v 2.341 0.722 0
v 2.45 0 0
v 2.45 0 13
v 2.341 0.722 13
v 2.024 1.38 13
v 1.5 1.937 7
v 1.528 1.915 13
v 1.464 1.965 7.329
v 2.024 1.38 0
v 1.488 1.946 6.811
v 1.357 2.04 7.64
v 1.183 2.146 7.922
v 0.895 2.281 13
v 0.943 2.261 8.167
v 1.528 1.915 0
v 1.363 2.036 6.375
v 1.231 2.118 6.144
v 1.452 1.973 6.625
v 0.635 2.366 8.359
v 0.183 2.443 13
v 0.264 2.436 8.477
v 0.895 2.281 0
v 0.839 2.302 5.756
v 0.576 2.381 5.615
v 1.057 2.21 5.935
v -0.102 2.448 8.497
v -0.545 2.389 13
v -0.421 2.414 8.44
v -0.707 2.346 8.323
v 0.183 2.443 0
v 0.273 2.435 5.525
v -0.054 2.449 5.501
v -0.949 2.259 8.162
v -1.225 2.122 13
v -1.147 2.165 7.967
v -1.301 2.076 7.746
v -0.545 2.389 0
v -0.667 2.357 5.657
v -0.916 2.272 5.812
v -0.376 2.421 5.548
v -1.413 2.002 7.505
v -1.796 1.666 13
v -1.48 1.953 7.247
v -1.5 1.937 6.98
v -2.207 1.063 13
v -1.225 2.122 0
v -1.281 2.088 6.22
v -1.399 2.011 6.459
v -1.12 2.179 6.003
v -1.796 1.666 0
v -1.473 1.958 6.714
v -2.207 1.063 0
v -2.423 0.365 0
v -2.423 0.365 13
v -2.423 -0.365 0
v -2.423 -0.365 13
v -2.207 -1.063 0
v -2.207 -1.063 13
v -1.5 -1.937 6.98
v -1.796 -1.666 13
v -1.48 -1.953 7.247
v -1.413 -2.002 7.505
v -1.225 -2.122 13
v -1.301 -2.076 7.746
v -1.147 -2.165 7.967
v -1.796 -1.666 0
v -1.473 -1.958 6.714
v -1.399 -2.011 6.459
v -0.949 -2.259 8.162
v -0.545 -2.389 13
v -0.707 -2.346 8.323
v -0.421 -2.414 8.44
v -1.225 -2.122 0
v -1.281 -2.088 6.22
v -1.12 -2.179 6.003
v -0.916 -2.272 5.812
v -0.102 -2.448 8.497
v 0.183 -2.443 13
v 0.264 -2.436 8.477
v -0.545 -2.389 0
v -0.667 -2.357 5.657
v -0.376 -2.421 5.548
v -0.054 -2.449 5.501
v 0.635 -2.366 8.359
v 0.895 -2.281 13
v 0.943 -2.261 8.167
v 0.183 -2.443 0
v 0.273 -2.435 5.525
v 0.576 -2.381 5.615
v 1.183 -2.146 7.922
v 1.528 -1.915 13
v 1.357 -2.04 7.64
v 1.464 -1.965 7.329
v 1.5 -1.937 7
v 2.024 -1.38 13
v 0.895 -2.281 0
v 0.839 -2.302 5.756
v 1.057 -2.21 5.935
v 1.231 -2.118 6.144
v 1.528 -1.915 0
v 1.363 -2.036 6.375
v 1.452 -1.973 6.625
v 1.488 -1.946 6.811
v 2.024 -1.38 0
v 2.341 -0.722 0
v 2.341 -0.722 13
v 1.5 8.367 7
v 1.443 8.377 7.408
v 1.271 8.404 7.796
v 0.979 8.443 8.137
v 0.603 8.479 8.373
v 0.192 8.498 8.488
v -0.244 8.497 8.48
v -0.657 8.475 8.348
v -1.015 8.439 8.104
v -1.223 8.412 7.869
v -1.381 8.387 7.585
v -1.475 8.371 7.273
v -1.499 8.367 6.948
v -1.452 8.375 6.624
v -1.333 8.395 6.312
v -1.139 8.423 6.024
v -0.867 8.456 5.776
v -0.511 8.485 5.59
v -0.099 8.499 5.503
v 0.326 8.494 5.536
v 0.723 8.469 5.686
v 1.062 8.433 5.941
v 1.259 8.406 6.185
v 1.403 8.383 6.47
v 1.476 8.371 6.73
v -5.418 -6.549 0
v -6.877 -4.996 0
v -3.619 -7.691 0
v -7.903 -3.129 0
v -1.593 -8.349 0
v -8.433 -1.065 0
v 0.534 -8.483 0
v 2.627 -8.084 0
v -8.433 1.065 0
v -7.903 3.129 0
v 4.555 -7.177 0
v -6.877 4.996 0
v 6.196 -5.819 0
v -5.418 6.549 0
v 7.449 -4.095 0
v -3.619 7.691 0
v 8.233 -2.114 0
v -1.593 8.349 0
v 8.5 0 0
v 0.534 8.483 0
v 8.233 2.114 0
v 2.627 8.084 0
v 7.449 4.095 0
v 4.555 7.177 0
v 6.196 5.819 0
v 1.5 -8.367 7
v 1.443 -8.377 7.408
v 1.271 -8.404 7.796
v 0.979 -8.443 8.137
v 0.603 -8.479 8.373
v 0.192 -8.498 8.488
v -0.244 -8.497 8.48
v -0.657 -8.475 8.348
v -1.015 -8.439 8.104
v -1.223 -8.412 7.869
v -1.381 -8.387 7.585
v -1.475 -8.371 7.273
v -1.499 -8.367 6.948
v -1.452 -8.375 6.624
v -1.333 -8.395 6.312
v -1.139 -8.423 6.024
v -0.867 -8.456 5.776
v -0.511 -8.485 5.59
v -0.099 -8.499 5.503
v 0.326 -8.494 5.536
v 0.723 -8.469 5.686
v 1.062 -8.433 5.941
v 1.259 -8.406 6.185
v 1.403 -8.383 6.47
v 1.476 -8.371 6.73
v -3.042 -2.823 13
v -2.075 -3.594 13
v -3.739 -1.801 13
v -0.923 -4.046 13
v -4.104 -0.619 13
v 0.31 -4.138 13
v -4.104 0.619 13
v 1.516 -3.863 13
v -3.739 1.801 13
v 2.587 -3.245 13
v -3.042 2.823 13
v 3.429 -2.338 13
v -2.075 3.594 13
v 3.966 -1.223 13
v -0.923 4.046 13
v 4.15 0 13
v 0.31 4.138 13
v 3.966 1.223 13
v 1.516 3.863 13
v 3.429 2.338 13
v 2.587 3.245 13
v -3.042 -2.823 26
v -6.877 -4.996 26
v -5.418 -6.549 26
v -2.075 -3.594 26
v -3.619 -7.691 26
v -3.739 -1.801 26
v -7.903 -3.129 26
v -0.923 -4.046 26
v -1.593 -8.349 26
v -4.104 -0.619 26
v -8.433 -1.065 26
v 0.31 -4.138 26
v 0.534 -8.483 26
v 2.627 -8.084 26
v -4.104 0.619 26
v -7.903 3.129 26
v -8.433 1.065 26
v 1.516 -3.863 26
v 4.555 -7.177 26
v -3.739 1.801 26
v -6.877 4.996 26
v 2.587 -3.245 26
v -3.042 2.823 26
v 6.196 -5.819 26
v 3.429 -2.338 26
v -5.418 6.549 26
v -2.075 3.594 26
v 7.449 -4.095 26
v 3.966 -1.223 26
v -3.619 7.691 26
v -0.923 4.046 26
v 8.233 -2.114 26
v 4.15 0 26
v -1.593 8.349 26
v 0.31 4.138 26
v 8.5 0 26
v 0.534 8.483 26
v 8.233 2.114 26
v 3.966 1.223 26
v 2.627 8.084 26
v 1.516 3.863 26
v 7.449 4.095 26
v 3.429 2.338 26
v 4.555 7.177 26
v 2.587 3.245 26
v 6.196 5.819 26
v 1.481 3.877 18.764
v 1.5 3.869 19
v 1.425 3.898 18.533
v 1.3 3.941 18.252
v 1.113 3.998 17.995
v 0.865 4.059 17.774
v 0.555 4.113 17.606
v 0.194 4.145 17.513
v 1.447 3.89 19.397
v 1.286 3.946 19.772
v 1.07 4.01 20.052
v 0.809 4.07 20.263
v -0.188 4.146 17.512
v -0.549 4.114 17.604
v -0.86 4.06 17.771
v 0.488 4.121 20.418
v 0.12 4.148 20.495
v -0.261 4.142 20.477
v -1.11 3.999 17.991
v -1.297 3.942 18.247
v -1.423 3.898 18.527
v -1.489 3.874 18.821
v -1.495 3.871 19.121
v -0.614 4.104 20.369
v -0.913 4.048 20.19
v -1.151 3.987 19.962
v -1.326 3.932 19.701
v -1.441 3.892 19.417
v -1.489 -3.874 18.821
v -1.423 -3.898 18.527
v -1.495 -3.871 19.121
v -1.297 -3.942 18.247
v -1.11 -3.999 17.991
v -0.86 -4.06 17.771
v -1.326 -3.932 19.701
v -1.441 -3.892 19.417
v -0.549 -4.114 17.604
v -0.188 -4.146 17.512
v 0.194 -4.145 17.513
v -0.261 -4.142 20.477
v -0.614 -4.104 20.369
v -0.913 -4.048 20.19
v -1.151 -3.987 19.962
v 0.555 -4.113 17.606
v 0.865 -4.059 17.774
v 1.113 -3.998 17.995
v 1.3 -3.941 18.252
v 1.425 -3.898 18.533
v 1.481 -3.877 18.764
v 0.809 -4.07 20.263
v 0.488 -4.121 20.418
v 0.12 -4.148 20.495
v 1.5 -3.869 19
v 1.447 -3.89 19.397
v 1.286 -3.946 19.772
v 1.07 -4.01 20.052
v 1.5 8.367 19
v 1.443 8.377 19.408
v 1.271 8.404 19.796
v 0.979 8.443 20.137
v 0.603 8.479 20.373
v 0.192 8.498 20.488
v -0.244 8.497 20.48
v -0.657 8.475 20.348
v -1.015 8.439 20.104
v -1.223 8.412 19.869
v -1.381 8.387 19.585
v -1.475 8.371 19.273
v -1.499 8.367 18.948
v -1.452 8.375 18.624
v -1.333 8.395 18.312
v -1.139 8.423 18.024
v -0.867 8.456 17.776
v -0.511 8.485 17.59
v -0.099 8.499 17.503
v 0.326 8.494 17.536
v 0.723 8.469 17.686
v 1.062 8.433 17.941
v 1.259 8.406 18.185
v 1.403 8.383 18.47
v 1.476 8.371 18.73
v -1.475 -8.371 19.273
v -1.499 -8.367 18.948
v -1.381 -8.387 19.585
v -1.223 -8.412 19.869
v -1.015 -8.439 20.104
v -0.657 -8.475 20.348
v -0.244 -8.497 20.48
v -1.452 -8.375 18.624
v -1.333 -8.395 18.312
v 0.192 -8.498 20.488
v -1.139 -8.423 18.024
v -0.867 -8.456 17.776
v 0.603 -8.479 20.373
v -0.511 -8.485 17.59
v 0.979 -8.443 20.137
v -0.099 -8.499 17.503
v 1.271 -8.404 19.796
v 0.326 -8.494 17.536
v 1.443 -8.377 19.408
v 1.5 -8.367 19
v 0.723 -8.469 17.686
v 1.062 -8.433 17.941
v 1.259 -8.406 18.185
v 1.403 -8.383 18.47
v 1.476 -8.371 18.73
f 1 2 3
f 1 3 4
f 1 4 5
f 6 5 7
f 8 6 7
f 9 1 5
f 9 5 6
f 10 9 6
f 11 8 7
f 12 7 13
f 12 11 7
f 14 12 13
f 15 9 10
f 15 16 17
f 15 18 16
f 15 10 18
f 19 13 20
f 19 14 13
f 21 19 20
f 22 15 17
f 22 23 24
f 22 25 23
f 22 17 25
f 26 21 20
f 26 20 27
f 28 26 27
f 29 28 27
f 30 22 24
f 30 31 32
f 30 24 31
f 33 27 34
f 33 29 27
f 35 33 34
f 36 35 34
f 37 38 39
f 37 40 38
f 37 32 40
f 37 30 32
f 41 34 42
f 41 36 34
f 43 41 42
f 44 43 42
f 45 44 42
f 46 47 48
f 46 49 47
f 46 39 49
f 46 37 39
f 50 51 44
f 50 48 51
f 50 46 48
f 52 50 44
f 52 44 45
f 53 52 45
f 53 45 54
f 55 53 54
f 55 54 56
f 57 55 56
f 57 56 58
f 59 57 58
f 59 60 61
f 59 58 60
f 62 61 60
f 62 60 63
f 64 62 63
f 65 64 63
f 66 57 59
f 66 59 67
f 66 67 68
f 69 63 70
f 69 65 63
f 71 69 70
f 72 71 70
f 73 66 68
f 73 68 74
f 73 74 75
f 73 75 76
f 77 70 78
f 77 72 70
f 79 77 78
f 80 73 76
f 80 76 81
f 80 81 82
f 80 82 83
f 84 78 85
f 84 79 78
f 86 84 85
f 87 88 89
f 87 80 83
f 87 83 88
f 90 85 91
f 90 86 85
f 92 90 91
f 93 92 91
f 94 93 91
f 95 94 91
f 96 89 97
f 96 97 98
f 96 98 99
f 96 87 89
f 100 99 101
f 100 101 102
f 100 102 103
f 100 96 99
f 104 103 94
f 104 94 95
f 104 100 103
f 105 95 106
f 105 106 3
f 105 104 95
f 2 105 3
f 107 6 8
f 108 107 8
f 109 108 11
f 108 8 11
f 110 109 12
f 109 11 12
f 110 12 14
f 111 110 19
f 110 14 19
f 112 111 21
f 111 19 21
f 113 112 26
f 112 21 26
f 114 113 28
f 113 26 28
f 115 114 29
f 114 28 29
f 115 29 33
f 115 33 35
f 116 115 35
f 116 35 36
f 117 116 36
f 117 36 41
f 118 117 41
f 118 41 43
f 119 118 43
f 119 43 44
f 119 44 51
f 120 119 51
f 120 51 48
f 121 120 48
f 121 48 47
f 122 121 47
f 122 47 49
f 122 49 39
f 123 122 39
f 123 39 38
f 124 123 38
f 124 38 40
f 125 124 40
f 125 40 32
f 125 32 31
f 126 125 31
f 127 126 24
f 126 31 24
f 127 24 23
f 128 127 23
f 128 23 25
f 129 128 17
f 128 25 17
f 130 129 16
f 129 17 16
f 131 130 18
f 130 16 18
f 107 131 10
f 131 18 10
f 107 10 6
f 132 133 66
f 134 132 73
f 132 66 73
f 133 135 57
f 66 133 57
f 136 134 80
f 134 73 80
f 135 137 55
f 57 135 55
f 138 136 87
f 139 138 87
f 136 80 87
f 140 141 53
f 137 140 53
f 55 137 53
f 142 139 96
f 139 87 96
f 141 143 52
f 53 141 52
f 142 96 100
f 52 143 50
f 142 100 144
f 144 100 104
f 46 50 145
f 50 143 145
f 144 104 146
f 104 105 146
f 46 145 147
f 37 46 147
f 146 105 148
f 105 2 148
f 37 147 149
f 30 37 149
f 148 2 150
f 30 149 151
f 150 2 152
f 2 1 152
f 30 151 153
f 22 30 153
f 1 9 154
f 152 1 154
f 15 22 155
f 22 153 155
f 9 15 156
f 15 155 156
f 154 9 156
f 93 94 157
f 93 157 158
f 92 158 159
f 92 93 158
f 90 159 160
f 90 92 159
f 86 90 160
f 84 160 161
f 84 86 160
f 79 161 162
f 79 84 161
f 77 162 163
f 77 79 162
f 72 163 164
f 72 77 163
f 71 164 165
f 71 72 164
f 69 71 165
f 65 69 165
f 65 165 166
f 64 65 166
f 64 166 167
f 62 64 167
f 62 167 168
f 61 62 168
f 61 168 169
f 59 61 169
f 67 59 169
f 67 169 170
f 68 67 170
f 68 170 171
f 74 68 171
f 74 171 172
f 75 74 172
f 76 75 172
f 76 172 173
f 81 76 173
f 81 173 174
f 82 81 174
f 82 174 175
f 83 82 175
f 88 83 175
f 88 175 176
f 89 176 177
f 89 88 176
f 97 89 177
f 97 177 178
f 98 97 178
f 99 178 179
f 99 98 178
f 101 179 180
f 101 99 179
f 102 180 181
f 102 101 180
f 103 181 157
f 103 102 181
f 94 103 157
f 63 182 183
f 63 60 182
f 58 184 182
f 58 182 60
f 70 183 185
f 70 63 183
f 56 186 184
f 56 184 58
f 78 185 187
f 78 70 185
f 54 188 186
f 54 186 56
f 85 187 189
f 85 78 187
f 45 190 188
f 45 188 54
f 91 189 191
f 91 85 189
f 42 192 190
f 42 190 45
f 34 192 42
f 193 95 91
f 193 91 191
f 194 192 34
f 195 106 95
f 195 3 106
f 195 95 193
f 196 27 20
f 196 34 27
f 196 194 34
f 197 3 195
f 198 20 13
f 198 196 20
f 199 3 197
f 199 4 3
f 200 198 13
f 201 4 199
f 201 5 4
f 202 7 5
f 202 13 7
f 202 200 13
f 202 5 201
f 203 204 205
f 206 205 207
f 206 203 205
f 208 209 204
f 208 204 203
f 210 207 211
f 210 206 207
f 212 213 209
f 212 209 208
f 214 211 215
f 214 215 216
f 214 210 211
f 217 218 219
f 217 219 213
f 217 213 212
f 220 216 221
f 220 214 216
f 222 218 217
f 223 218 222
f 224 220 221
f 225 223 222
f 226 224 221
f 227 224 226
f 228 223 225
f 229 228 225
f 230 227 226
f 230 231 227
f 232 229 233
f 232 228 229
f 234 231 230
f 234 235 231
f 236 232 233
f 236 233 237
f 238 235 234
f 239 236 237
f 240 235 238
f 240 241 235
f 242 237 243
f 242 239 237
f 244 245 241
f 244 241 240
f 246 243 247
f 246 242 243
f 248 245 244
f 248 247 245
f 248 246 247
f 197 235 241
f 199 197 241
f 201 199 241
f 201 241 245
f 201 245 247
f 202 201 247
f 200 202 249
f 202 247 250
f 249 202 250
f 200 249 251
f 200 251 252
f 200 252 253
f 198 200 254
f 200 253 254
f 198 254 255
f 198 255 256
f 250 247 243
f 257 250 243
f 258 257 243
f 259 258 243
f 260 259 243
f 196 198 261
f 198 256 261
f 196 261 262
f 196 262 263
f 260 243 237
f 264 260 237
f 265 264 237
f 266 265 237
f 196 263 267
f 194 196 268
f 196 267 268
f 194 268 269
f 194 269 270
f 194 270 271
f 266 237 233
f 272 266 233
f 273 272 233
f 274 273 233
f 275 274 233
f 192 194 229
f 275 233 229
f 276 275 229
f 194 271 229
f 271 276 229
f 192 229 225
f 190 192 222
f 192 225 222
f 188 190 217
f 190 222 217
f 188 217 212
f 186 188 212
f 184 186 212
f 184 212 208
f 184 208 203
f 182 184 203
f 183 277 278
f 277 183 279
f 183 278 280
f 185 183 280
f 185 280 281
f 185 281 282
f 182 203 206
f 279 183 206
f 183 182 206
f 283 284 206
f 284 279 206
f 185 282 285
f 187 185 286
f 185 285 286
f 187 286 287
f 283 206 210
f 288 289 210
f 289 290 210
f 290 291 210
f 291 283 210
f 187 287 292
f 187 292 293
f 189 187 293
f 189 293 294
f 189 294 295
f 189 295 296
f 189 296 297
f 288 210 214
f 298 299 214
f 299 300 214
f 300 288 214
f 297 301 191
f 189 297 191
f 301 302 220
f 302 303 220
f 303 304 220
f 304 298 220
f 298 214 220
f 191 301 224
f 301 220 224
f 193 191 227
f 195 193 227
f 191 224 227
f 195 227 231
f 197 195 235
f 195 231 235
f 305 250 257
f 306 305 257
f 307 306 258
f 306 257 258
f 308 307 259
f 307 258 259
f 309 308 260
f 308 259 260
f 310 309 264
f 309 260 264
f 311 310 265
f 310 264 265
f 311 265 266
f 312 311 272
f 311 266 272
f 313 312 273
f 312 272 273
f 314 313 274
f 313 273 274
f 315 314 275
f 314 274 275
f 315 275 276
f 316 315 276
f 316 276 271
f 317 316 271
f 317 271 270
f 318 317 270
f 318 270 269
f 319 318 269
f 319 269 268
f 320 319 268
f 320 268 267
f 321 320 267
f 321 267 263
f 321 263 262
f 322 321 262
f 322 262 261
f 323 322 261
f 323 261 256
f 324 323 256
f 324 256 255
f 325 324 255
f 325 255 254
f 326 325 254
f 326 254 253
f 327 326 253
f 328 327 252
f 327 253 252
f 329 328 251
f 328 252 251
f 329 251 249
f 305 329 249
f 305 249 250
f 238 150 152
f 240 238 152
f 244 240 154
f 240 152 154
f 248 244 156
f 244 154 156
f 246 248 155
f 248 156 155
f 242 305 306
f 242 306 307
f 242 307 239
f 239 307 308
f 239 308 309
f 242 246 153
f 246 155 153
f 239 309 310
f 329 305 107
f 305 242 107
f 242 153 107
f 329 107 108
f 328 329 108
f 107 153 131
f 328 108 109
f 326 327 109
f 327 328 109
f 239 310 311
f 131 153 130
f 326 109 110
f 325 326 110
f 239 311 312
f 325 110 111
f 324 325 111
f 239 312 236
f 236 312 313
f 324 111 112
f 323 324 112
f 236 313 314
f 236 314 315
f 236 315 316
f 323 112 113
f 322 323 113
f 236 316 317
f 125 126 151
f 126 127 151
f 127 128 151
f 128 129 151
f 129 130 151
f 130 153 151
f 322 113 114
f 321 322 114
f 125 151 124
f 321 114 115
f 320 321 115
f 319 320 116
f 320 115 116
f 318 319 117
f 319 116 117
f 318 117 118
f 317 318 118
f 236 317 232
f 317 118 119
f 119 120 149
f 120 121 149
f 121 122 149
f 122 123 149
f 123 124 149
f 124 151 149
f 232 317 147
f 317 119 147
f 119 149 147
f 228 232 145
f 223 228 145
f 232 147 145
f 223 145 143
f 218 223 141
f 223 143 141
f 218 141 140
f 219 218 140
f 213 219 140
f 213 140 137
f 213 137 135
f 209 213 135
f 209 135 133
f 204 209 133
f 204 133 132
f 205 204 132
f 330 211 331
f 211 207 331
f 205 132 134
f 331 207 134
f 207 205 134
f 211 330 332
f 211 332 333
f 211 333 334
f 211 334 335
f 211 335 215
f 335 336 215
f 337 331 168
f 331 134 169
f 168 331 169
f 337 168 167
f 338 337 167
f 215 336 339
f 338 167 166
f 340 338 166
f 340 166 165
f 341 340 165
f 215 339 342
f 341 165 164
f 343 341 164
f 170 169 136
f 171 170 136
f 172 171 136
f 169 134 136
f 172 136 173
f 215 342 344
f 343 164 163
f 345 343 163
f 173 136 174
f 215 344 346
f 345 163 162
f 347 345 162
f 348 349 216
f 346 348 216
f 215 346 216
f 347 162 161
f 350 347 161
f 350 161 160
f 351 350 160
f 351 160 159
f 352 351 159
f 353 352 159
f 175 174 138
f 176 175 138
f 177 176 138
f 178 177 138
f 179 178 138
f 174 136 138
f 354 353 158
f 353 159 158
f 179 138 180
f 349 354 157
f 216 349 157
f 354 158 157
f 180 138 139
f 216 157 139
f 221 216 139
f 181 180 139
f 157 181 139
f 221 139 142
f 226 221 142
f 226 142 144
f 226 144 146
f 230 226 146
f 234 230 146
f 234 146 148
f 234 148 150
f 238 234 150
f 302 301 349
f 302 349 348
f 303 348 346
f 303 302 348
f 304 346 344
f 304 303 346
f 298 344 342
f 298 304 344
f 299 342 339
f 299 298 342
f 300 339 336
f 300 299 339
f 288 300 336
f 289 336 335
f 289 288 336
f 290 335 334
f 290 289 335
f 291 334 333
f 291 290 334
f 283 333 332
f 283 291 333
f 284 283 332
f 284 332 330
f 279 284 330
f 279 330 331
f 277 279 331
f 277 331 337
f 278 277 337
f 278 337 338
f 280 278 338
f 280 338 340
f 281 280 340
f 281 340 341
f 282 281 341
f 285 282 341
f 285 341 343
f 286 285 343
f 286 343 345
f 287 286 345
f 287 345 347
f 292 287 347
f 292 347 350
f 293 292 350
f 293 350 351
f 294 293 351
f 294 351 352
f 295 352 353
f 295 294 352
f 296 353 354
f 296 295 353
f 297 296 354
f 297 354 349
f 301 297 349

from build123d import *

# Parameters (mm, degrees)
F0_R          = 8.5
F0_R_2        = 2.45
F1_DEPTH      = 26
F2_R          = 4.15
F2_R_2        = 2.45
F3_DEPTH      = 13
F4_R          = 1.5
F5_DEPTH      = 25
F5_DEPTH_BACK = 25


with BuildPart() as f1:
    # F0 (on Top) → F1 (new body)
    with BuildSketch(Plane.XY):
        Circle(F0_R)
        Circle(F0_R_2, mode=Mode.SUBTRACT)
    extrude(amount=F1_DEPTH)

    # F2 (on face) → F3 (cut)
    with BuildSketch(Plane.XY.offset(26)):
        Circle(F2_R)
        Circle(F2_R_2, mode=Mode.SUBTRACT)
    extrude(amount=-F3_DEPTH, mode=Mode.SUBTRACT)

    # F4 (on Front) → F5 (cut, two sides)
    with BuildSketch(Plane.XZ) as f5_sk:
        with Locations((0, 19)):
            Circle(F4_R)
        with Locations((0, 7)):
            Circle(F4_R)
    extrude(amount=-F5_DEPTH, mode=Mode.SUBTRACT)
    extrude(f5_sk.sketch, amount=F5_DEPTH_BACK, mode=Mode.SUBTRACT)


solid = f1.part
